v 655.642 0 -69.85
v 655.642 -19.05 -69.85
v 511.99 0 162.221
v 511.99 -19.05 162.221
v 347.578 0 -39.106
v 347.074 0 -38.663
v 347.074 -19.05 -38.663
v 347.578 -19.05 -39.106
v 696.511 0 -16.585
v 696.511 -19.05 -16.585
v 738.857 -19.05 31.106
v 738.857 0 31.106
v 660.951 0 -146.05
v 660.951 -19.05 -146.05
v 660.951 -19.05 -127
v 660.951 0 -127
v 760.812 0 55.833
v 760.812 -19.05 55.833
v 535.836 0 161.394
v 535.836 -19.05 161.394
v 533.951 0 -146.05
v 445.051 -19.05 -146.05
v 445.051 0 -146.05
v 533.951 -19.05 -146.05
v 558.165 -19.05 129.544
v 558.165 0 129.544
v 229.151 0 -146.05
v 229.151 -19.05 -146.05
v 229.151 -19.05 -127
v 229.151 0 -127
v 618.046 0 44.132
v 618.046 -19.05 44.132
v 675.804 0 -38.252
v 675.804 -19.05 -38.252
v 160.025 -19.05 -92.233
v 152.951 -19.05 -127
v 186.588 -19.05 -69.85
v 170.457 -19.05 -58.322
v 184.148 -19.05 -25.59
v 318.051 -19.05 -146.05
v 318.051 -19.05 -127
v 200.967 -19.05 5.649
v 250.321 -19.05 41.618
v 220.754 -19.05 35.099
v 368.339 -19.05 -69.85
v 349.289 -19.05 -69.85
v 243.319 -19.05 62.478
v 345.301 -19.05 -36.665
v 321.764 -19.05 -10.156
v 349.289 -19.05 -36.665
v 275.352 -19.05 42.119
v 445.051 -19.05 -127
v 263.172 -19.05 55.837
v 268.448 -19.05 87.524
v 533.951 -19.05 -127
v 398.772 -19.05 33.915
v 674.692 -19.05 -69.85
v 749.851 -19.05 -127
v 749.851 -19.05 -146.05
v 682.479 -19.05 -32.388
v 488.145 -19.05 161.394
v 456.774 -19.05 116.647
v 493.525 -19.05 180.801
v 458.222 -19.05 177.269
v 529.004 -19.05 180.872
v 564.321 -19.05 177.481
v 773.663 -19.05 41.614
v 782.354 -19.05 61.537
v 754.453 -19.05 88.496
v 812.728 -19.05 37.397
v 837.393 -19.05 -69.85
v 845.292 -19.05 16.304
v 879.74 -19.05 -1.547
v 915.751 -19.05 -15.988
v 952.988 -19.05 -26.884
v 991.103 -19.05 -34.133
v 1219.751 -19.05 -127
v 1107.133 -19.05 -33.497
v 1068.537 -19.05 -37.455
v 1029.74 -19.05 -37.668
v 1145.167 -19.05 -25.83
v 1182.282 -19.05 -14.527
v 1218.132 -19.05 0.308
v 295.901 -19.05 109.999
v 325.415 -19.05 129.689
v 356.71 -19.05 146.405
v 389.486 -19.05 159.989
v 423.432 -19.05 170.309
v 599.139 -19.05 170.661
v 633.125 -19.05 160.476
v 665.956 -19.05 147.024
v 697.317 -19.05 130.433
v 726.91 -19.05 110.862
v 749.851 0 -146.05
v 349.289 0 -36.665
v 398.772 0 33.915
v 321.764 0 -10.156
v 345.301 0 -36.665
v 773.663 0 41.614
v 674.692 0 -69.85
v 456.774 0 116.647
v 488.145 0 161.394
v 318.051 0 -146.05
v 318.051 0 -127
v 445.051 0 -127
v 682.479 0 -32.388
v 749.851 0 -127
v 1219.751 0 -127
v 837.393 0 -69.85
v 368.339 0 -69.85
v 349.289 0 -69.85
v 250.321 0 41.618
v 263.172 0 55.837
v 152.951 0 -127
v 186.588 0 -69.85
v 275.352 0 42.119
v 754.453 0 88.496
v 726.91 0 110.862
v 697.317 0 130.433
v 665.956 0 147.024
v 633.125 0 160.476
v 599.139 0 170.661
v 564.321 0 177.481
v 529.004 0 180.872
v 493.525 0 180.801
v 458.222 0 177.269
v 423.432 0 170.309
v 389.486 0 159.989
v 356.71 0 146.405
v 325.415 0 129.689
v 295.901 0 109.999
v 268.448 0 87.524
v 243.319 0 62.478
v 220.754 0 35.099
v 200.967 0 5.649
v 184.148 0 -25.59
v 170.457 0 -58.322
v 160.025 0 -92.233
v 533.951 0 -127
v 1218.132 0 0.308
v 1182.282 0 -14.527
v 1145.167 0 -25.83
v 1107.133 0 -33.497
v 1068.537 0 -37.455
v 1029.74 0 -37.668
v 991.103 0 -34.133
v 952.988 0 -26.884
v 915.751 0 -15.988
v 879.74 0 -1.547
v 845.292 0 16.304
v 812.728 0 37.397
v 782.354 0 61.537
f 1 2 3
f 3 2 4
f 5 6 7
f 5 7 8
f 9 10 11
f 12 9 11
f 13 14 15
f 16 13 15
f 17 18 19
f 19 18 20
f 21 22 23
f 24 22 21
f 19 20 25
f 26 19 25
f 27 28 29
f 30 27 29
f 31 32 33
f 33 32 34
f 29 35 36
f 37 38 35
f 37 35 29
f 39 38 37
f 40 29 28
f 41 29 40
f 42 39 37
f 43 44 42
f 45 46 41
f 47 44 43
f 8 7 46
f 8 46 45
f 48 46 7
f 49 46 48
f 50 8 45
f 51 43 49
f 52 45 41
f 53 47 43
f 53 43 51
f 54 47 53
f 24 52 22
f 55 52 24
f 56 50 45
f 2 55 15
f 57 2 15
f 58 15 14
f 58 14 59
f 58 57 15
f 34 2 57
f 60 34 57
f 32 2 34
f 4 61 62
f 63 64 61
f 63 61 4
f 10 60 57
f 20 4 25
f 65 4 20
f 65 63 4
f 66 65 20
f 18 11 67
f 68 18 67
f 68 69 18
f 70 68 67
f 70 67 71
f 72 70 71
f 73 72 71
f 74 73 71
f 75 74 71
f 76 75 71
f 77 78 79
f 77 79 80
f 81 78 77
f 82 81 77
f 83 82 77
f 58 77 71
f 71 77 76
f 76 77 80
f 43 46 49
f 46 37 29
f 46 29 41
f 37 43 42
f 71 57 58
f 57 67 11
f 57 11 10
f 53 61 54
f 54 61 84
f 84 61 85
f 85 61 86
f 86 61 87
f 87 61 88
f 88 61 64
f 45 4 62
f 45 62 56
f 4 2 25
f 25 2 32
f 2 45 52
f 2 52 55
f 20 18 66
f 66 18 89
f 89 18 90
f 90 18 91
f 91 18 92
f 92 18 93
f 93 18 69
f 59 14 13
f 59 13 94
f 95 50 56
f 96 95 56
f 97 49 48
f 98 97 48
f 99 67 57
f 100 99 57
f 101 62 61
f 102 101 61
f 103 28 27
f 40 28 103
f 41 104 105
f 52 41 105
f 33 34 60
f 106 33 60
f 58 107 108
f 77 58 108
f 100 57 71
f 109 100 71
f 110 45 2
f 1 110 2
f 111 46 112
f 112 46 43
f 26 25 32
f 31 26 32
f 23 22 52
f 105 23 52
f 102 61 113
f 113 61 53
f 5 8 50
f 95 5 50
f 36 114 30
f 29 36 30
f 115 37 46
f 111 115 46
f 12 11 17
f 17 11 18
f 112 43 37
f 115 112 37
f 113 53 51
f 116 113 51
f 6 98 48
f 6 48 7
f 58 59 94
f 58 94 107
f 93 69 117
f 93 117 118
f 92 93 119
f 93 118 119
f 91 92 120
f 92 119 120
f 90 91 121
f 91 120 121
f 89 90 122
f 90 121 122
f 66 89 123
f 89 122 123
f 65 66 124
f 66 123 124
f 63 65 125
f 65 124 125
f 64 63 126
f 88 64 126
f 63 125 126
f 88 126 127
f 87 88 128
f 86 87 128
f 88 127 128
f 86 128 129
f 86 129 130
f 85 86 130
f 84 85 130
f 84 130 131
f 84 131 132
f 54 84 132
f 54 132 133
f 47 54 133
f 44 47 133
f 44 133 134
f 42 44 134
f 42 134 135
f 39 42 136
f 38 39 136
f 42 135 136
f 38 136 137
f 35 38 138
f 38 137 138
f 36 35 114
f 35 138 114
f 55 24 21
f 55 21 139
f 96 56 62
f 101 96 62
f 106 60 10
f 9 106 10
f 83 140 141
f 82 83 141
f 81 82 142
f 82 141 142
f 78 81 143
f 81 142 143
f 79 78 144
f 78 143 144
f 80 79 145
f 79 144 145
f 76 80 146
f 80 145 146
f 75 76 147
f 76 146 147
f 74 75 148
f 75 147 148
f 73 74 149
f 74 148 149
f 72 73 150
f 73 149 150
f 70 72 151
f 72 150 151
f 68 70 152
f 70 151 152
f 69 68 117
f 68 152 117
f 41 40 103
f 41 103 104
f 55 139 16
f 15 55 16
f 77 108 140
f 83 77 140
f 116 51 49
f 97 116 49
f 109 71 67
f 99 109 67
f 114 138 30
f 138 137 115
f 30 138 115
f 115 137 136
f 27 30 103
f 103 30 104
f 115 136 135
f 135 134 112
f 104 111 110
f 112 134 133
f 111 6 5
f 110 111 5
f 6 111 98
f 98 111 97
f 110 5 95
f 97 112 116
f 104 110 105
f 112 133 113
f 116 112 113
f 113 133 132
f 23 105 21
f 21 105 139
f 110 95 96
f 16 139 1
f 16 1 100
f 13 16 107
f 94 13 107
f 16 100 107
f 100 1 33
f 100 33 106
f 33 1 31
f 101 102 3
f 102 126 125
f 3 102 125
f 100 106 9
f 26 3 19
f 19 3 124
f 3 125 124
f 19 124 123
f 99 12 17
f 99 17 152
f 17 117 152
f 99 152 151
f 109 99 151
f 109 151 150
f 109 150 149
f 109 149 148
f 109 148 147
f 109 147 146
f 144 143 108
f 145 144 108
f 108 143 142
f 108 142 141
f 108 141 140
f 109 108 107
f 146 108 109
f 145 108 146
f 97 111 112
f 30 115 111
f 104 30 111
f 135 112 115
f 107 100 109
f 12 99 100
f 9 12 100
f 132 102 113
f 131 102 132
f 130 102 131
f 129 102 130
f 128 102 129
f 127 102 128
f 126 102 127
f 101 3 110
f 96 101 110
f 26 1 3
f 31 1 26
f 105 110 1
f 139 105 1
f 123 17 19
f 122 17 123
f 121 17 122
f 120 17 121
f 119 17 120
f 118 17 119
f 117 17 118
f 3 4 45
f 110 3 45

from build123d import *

# Parameters (mm, degrees)
F1_DEPTH = 19.05
F3_DEPTH = 25.4
F4_W     = 88.9
F4_H     = 19.05
F5_DEPTH = 19.05


with BuildPart() as f1:
    # F0 (on Front) → F1 (new body)
    with BuildSketch(Plane.XZ):
        with BuildLine():
            Line((754.452639, -127), (1219.750957, -127))
            Line((1219.750957, -127), (1218.132401, 0.307838))
            ThreePointArc((1218.132401, 0.307838), (971.957472, -30.969021), (754.452639, 88.496394))
            Line((754.452639, 88.496394), (754.452639, -127))
        make_face()
        with BuildLine():
            Line((152.950957, -127), (754.452639, -127))
            Line((754.452639, -127), (754.452639, 88.496394))
            ThreePointArc((754.452639, 88.496394), (389.486399, 159.988648), (152.950957, -127))
        make_face()
    extrude(amount=F1_DEPTH)

    # F2 (on face) → F3 (cut)
    with BuildSketch(Plane.XZ.offset(19.05)):
        Polygon((349.289218, -69.85), (250.3214, 41.61797), (186.588, -69.85), (250.3214, -69.85), (313.393829, -69.85), (314.054799, -69.85), align=None)
        Polygon((398.772179, 33.915376), (456.774034, 116.646986), (488.145278, 161.393719), (263.171888, 55.837033), (275.35156, 42.119006), (321.764452, -10.156076), (345.300821, -36.665212), (347.074358, -38.662755), (347.578352, -39.105525), (349.289218, -36.665212), align=None)
        Polygon((511.990437, 162.220746), (368.339218, -69.85), (655.641655, -69.85), align=None)
        Polygon((535.835596, 161.393719), (558.164751, 129.544273), (618.046186, 44.131702), (675.804029, -38.251859), (682.479221, -32.387854), (696.510871, -16.584994), (738.856518, 31.105928), (760.812477, 55.83338), align=None)
        Polygon((837.392874, -69.85), (773.662731, 41.614158), (674.691655, -69.85), align=None)
    extrude(amount=-F3_DEPTH, mode=Mode.SUBTRACT)

    # F4 (on face) → F5 (join)
    with BuildSketch(Plane.XZ.offset(19.05)):
        with Locations((705.400957, -136.525)):
            Rectangle(F4_W, F4_H)
        with Locations((273.600957, -136.525)):
            Rectangle(F4_W, F4_H)
        with Locations((489.500957, -136.525)):
            Rectangle(F4_W, F4_H)
    extrude(amount=-F5_DEPTH)


solid = f1.part
